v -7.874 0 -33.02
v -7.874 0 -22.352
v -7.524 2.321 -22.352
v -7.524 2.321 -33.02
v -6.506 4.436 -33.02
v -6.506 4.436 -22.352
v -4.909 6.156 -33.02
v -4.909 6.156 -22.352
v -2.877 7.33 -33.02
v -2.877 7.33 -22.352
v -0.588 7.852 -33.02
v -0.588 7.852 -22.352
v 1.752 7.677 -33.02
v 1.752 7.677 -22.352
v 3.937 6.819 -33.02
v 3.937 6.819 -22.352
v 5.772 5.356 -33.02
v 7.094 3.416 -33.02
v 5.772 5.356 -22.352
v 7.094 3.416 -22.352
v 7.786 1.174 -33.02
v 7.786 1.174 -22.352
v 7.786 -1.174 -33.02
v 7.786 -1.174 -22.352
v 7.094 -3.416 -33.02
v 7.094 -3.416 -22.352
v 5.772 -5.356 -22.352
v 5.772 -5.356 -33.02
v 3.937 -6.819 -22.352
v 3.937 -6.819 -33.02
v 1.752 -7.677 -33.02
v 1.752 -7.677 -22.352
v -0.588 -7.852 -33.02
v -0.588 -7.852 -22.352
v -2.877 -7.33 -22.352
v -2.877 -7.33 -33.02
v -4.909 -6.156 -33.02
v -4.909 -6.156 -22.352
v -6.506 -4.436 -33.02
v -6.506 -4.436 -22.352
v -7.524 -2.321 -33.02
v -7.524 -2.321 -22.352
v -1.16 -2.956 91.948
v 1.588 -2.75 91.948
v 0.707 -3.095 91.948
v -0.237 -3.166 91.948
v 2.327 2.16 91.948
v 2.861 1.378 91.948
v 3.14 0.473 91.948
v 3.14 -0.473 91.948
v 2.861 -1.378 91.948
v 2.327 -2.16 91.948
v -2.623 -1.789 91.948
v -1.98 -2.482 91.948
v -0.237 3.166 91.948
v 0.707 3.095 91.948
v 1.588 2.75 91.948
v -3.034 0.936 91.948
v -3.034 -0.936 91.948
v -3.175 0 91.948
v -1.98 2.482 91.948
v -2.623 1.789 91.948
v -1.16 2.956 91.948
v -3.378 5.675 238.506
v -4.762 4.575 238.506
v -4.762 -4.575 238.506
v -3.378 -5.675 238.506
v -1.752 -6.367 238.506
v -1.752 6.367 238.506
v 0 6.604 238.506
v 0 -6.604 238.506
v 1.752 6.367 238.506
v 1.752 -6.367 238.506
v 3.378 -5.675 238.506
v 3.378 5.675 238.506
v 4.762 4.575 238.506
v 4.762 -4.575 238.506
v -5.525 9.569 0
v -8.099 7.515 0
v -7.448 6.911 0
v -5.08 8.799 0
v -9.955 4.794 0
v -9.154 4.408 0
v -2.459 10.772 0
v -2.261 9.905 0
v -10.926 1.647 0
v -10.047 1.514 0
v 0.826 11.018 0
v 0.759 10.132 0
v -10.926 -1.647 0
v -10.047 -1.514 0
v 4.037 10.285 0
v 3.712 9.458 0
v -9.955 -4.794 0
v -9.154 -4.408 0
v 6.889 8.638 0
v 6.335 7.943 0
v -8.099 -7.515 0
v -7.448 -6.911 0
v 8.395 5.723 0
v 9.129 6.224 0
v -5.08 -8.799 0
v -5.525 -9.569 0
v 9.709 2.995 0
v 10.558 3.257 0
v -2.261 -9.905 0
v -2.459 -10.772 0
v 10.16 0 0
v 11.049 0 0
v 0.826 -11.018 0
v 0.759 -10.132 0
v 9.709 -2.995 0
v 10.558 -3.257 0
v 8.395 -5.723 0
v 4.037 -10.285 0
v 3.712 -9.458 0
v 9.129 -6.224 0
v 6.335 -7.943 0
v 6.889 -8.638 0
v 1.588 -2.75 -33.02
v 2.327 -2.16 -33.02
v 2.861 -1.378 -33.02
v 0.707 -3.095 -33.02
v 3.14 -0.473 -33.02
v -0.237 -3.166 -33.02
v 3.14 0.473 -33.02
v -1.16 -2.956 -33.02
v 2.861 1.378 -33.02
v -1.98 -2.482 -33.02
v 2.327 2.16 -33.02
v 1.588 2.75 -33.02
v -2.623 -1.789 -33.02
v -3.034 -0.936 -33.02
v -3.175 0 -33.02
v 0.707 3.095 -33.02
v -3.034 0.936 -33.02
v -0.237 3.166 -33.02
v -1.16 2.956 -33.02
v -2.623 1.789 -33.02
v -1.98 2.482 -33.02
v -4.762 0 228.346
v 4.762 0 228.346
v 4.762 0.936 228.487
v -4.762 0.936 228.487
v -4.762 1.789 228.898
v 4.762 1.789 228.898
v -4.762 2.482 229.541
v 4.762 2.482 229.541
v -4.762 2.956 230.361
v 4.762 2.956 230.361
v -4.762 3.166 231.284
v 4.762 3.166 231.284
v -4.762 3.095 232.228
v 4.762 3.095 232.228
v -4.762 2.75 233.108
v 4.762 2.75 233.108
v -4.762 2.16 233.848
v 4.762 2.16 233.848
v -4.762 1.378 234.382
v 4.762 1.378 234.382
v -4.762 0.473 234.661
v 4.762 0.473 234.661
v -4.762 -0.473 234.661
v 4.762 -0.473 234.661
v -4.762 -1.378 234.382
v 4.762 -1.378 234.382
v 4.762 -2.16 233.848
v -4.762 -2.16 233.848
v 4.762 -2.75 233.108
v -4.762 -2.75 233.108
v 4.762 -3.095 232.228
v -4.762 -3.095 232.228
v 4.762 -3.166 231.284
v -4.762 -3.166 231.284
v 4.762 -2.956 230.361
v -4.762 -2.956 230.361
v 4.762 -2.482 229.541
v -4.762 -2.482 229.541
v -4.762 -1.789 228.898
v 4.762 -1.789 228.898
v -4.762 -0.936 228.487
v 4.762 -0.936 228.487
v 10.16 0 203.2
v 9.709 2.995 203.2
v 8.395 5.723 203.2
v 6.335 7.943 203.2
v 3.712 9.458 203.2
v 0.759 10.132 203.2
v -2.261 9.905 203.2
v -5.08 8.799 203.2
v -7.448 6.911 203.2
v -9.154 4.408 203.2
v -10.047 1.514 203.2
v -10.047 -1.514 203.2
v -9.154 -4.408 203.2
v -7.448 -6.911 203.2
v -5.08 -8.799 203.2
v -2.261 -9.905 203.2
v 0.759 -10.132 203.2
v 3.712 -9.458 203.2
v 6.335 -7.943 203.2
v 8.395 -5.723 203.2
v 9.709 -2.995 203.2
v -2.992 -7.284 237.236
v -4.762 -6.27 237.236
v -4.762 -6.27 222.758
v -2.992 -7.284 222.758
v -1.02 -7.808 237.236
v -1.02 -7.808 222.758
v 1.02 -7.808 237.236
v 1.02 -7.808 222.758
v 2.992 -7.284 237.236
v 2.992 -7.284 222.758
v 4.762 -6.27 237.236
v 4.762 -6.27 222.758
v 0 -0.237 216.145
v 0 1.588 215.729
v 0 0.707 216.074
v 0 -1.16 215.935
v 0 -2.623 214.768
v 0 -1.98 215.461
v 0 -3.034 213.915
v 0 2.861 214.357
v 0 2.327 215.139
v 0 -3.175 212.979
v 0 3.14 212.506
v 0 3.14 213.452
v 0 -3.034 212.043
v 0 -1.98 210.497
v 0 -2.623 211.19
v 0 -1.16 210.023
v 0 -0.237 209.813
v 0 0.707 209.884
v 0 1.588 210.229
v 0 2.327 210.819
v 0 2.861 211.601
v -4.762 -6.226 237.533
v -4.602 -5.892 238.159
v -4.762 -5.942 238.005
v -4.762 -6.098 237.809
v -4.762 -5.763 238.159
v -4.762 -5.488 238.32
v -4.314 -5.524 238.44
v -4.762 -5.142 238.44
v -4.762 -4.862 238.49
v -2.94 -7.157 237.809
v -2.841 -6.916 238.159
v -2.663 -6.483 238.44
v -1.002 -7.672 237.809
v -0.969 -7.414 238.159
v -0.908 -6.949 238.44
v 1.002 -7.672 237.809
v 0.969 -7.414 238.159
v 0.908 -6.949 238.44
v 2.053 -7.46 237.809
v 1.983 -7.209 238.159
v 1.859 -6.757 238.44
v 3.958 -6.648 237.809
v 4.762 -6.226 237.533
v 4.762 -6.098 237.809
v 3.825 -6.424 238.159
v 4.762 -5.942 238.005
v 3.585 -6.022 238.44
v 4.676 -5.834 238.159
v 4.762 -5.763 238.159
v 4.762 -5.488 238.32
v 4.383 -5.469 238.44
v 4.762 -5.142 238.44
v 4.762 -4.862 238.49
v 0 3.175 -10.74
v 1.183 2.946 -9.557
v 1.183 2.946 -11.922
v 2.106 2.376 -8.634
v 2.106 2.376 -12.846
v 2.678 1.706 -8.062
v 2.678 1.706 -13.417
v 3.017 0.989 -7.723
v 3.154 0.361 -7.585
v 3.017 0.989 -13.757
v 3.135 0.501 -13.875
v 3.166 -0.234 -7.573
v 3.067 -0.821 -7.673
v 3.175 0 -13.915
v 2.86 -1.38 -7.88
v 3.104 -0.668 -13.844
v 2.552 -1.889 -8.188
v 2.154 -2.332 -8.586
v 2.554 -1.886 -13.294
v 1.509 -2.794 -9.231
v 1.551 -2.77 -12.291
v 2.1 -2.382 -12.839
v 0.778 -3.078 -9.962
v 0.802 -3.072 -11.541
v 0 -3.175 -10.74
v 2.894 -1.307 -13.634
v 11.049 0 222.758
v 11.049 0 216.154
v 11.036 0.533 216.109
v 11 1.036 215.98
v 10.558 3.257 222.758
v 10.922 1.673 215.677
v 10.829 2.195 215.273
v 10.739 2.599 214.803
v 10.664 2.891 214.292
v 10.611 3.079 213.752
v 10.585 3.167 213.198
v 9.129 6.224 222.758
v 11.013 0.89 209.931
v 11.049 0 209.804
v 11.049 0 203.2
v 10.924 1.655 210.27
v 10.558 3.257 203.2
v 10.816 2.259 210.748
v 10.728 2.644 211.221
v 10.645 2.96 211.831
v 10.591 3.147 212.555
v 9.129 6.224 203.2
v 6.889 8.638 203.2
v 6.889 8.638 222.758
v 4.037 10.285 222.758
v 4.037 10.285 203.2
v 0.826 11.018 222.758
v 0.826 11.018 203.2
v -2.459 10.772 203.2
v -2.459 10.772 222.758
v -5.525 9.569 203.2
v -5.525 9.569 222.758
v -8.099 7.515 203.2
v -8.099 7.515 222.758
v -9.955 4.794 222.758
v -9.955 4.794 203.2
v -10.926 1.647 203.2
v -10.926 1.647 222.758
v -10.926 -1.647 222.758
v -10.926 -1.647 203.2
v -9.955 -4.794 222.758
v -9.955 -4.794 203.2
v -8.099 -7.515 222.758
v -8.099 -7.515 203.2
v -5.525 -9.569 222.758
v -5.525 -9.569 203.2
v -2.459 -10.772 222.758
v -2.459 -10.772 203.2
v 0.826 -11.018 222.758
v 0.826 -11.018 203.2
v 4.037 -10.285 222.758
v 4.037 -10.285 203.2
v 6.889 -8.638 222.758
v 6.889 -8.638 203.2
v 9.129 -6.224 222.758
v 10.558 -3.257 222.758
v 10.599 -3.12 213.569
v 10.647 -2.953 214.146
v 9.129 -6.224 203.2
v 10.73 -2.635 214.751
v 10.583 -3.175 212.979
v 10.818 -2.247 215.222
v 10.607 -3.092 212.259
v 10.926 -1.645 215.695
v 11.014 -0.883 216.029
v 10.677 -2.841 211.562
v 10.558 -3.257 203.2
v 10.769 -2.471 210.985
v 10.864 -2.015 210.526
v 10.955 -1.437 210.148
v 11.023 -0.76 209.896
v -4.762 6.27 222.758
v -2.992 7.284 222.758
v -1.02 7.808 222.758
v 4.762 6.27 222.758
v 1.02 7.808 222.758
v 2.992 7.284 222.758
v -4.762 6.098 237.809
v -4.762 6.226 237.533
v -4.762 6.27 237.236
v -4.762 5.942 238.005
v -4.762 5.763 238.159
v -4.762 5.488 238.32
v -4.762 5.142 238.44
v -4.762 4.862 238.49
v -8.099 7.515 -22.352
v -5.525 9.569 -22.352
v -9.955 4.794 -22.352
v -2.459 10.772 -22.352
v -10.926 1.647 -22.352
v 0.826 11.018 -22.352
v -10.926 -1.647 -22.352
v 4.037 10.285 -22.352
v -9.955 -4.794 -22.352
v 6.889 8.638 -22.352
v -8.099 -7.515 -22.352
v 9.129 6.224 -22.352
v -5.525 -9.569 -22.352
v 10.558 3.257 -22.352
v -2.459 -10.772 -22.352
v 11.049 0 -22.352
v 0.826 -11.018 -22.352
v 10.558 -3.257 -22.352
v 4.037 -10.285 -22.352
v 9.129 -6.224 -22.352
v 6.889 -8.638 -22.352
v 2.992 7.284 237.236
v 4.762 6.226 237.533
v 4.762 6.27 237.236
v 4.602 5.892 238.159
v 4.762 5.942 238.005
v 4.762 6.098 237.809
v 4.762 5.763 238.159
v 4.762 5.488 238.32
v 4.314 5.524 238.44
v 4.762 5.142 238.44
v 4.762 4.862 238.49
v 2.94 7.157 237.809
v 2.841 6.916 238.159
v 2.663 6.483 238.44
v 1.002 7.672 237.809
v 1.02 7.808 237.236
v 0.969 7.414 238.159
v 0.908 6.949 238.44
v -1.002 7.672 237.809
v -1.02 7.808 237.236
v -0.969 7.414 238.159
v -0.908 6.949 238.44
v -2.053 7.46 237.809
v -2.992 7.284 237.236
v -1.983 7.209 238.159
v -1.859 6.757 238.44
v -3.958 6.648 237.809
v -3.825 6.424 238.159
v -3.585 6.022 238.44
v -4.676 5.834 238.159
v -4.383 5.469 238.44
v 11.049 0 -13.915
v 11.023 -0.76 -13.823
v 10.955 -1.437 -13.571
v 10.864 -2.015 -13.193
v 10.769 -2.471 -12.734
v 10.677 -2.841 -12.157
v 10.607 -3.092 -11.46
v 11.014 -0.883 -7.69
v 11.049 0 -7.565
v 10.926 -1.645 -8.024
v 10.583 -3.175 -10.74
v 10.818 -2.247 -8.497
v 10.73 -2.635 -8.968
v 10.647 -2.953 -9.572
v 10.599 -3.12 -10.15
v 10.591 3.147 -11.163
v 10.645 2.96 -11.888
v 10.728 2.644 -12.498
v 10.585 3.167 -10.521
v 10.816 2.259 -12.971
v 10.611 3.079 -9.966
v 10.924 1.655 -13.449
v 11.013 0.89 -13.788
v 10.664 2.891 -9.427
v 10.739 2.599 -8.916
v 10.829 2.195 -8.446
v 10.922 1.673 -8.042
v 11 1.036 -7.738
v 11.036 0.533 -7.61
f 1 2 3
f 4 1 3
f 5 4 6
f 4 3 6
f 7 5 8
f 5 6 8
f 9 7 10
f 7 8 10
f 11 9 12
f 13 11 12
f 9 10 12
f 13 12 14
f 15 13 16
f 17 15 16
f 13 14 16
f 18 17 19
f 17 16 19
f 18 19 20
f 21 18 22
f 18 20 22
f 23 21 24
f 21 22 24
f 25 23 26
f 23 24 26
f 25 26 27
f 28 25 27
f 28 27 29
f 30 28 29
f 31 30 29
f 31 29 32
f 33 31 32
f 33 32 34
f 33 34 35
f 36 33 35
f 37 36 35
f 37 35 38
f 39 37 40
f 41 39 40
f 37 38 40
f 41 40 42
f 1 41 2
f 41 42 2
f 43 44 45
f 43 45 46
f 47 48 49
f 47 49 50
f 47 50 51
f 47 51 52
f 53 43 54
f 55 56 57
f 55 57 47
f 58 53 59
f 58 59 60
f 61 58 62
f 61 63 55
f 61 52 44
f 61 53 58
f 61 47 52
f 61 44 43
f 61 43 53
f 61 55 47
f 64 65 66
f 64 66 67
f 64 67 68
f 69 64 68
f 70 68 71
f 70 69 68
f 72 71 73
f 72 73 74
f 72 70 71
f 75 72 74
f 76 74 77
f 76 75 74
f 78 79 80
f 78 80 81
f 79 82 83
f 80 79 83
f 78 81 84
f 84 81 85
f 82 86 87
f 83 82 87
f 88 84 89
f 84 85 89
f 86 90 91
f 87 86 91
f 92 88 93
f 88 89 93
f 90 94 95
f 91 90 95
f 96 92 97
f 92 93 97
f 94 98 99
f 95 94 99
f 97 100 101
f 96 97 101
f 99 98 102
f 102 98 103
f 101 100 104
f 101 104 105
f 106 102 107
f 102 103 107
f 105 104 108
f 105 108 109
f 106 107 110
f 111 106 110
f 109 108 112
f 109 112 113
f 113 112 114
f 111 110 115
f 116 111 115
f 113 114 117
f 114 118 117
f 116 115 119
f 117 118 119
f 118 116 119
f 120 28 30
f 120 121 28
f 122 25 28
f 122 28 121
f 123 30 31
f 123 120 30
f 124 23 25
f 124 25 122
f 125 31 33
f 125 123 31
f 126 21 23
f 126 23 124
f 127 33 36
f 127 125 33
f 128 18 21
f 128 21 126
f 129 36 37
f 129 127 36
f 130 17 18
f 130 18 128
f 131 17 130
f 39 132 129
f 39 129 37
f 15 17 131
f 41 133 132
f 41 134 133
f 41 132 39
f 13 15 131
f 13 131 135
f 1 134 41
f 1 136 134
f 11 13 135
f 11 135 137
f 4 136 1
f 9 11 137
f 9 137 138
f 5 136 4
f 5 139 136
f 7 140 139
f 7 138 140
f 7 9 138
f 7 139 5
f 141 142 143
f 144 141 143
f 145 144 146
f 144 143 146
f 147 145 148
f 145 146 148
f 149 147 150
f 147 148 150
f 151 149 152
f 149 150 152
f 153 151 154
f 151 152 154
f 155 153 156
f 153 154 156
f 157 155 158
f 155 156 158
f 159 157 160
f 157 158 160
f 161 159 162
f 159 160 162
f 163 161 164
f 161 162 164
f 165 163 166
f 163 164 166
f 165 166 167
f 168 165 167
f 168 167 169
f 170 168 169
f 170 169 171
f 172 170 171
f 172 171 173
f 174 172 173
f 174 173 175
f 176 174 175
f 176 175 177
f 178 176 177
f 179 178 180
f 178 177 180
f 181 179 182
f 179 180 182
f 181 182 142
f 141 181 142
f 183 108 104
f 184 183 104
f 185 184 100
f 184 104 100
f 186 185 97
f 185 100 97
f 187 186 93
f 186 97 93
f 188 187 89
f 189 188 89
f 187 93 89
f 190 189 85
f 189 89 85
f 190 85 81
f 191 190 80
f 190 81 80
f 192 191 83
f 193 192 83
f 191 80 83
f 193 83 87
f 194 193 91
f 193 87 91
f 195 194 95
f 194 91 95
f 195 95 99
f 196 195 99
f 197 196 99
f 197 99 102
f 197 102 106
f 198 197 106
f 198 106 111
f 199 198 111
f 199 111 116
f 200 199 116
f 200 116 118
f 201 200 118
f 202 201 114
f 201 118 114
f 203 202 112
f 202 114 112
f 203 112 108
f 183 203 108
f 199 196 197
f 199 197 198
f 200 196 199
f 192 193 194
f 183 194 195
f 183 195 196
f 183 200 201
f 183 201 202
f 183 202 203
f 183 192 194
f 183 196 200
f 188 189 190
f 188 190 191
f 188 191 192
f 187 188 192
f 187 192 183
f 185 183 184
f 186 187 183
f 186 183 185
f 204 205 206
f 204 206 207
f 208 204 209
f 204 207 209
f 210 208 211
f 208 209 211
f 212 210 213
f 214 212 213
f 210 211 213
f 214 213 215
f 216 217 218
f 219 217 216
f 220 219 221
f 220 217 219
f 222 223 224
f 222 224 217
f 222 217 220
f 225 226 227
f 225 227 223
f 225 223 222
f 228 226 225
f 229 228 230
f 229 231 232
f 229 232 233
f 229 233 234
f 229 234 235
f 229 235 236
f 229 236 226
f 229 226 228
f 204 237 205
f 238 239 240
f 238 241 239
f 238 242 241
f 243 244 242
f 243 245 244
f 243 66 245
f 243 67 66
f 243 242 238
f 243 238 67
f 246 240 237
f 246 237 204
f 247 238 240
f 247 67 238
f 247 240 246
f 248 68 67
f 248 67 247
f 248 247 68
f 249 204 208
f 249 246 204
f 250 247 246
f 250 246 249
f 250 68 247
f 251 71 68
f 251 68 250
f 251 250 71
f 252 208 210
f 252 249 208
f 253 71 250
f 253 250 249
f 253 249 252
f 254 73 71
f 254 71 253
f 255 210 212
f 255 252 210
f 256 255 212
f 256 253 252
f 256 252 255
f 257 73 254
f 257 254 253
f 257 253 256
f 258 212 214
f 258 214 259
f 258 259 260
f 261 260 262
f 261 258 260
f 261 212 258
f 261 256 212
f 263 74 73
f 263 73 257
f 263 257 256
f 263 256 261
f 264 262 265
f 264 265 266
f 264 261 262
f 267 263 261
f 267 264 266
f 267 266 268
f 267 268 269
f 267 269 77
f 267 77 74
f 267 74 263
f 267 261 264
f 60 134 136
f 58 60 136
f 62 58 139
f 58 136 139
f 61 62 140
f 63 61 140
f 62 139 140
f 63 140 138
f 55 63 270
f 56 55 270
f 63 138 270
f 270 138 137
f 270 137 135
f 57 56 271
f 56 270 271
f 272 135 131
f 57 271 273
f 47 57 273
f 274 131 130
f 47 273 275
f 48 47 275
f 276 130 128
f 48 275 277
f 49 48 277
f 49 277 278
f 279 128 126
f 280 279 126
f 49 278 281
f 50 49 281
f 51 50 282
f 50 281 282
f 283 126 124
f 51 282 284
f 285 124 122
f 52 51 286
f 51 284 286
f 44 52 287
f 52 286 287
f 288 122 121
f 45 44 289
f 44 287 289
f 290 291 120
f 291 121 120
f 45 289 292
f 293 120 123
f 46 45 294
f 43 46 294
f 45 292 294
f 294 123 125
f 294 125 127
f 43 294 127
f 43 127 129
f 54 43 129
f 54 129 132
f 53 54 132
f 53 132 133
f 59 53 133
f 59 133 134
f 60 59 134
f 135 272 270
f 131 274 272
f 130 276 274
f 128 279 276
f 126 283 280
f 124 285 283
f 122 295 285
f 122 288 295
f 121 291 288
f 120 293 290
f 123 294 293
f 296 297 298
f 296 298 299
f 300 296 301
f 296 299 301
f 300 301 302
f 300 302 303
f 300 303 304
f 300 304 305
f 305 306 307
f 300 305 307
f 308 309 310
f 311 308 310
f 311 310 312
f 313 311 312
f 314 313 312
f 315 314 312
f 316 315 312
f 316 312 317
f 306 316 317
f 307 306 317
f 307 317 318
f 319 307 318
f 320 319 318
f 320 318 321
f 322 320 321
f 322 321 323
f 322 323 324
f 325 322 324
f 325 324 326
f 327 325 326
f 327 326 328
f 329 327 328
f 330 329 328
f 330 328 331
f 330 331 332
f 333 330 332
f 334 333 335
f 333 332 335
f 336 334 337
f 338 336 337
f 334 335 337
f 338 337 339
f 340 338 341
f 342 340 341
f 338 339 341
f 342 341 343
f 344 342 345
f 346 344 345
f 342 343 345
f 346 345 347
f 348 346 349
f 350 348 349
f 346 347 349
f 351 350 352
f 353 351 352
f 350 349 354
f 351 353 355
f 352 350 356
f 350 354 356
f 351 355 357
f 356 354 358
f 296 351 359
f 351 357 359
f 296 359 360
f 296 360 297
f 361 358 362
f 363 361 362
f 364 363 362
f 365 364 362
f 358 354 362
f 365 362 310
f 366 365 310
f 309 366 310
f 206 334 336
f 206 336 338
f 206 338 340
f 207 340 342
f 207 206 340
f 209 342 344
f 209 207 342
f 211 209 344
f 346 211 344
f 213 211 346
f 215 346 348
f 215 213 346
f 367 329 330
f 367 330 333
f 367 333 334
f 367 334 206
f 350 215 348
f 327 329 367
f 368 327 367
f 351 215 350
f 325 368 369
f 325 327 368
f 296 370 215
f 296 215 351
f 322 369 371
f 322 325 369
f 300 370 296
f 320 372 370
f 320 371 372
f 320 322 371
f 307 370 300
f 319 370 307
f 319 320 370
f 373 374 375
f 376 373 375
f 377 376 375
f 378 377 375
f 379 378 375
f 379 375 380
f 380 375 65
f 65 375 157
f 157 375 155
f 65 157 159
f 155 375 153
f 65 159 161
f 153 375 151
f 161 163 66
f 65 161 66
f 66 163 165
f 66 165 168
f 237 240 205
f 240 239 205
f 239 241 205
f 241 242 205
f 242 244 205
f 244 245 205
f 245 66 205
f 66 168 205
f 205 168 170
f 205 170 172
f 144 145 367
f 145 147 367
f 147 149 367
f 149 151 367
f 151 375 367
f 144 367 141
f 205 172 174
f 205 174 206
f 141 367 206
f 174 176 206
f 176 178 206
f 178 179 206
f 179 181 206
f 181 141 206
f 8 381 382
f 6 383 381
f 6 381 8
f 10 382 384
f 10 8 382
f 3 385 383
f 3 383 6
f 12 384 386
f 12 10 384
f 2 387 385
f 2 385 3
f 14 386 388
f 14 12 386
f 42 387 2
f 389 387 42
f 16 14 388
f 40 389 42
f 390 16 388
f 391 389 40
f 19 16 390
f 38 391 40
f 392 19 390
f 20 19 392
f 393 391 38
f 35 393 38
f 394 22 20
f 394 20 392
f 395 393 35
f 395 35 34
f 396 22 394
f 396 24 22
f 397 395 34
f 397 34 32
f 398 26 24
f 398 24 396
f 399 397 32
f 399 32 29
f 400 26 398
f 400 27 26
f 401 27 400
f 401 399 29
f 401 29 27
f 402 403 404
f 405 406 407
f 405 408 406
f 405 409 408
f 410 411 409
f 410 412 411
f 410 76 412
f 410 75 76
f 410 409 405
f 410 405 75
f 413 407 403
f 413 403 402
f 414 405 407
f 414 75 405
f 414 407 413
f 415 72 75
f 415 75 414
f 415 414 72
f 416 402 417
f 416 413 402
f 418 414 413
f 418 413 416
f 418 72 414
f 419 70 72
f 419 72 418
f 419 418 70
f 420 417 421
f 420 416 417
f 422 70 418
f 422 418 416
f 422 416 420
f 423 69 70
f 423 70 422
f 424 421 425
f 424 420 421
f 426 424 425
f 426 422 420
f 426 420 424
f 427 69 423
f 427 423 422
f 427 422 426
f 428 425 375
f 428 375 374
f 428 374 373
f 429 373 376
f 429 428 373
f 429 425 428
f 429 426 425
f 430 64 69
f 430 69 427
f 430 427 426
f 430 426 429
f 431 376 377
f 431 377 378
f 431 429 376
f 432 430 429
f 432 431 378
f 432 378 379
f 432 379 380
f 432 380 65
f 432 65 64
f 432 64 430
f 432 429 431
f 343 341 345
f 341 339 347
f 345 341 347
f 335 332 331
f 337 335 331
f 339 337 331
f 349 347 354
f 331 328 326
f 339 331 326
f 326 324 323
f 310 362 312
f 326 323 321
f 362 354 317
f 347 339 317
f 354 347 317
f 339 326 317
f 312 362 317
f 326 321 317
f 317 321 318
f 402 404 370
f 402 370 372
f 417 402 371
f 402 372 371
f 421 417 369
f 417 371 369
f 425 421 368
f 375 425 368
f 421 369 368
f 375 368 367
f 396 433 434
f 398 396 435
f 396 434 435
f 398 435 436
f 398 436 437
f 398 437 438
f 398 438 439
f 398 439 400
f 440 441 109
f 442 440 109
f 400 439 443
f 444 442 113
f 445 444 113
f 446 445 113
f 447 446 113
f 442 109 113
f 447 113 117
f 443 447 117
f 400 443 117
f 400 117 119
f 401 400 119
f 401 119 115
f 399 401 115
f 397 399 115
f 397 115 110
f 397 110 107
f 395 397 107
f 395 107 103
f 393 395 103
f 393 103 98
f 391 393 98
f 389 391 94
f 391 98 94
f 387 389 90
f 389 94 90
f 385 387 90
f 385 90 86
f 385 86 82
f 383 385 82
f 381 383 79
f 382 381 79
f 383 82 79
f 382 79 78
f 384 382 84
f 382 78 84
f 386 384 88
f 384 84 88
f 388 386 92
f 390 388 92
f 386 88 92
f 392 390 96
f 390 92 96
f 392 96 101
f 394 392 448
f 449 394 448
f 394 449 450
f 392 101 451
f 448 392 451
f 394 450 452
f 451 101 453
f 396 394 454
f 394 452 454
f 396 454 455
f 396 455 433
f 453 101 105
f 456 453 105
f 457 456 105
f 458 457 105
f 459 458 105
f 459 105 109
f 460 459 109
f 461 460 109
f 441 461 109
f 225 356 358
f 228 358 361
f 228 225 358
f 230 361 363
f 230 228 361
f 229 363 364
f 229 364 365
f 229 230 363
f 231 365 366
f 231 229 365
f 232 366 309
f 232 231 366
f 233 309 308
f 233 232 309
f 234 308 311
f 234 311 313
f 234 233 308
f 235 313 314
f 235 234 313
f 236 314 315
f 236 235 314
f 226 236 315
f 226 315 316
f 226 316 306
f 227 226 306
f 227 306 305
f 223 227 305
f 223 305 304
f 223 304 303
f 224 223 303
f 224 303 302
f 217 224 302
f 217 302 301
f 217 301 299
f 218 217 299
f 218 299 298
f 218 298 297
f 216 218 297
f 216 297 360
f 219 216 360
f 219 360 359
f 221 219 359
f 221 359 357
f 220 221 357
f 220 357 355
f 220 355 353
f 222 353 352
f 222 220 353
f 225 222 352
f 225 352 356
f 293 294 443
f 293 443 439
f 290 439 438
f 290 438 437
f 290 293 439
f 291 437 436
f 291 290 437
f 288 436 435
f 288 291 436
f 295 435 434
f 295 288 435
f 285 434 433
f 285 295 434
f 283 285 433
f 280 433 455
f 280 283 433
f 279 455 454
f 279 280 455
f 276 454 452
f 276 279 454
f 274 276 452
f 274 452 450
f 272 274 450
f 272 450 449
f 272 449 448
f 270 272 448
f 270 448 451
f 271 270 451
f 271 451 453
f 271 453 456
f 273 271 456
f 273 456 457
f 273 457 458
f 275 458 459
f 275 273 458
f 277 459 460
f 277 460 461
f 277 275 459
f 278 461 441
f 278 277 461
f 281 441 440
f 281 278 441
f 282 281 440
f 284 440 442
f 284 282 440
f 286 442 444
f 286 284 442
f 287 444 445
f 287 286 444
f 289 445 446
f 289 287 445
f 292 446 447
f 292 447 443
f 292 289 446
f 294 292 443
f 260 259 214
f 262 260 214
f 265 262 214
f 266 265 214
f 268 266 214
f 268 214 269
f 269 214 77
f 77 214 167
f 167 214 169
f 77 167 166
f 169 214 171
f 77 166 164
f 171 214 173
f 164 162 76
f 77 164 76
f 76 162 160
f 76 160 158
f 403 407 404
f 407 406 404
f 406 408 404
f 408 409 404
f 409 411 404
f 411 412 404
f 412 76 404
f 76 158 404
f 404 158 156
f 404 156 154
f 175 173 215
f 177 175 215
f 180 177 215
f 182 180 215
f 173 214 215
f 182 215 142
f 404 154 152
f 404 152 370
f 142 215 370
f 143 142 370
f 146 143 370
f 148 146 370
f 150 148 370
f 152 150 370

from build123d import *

# Parameters (mm, degrees)
SKETCH1_R               = 10.16
BOSS_EXTRUDE1_DEPTH     = 203.2
SKETCH2_R               = 11.049
BOSS_EXTRUDE2_DEPTH     = 19.558
BOSS_EXTRUDE3_DEPTH     = 15.748
SKETCH4_R               = 3.175
CUT_EXTRUDE1_DEPTH      = 9.525
FILLET1_R               = 1.27
SKETCH5_R               = 11.049
BOSS_EXTRUDE4_DEPTH     = 22.352
SKETCH6_R               = 7.874
BOSS_EXTRUDE5_DEPTH     = 10.668
SKETCH7_R               = 3.175
CUT_EXTRUDE2_DEPTH      = 124.968
CUT_EXTRUDE3_REACH      = 241.017
CUT_EXTRUDE3_END_RADIUS = 11.049
SKETCH8_R               = 3.175


with BuildPart() as part:
    # Sketch1 → Boss-Extrude1 (new body)
    with BuildSketch(Plane.XY):
        Circle(SKETCH1_R)
    extrude(amount=BOSS_EXTRUDE1_DEPTH)

    # Sketch5 → Boss-Extrude4 (add)
    with BuildSketch(Plane(origin=(0, 0, 0), x_dir=(-1, 0, 0), z_dir=(0, 0, -1))):
        with Locations(Location((0, 0, 0), (0, 0, 180))):
            Circle(SKETCH5_R)
    extrude(amount=BOSS_EXTRUDE4_DEPTH)

    # Sketch6 → Boss-Extrude5 (add)
    with BuildSketch(Plane(origin=(0, 0, -22.352), x_dir=(-1, 0, 0), z_dir=(0, 0, -1))):
        Circle(SKETCH6_R)
    extrude(amount=BOSS_EXTRUDE5_DEPTH)

    # Sketch7 → Cut-Extrude2 (cut)
    with BuildSketch(Plane(origin=(0, 0, -33.02), x_dir=(-1, 0, 0), z_dir=(0, 0, -1))):
        Circle(SKETCH7_R)
    extrude(amount=-CUT_EXTRUDE2_DEPTH, mode=Mode.SUBTRACT)


with BuildPart() as body_2:
    # Sketch2 → Boss-Extrude2 (new body)
    with BuildSketch(Plane.XY.offset(203.2)):
        Circle(SKETCH2_R)
    extrude(amount=BOSS_EXTRUDE2_DEPTH)

    # Sketch3 → Boss-Extrude3 (add)
    with BuildSketch(Plane.XY.offset(222.758)):
        with BuildLine():
            Line((4.7625, -6.270444143), (4.7625, 6.270444143))
            ThreePointArc((4.7625, 6.270444143), (0, 7.874), (-4.7625, 6.270444143))
            Line((-4.7625, 6.270444143), (-4.7625, -6.270444143))
            ThreePointArc((-4.7625, -6.270444143), (0, -7.874), (4.7625, -6.270444143))
        make_face()
    extrude(amount=BOSS_EXTRUDE3_DEPTH)

    # Sketch4 → Cut-Extrude1 (cut)
    with BuildSketch(Plane(origin=(4.7625, 0, 0), x_dir=(0, 0, -1), z_dir=(1, 0, 0))):
        with Locations((-231.521, 0)):
            Circle(SKETCH4_R)
    extrude(amount=-CUT_EXTRUDE1_DEPTH, mode=Mode.SUBTRACT)

    # Fillet1
    fillet1_edges = [body_2.edges().sort_by_distance(p)[0] for p in [
        (0, 7.874, 238.506),
        (0, -7.874, 238.506),
    ]]
    fillet(fillet1_edges, radius=FILLET1_R)


with BuildPart() as cut_extrude3_tool:
    # Cut-Extrude3: up to this cylinder (the profile starts inside it)
    cut_extrude3_end = Plane(origin=(0, 0, 101.119601), z_dir=(0, 0, -1)) * Cylinder(CUT_EXTRUDE3_END_RADIUS, 728.850798, mode=Mode.PRIVATE)
    # Sketch8 → Cut-Extrude3 (new, up to the surface)
    with BuildSketch(Plane(origin=(0, 0, 0), x_dir=(0, 0, -1), z_dir=(1, 0, 0)), mode=Mode.PRIVATE) as cut_extrude3_sk1:
        with Locations(Location((-212.979, 0, 0), (0, 0, 270))):
            Circle(SKETCH8_R)
    cut_extrude3_tool1 = extrude(cut_extrude3_sk1.sketch, amount=CUT_EXTRUDE3_REACH, mode=Mode.PRIVATE) & cut_extrude3_end
    add(cut_extrude3_tool1.solids().sort_by_distance((0, 0, 212.979))[0])
    # Sketch8 → Cut-Extrude3 (new, up to the surface)
    with BuildSketch(Plane(origin=(0, 0, 0), x_dir=(0, 0, -1), z_dir=(1, 0, 0)), mode=Mode.PRIVATE) as cut_extrude3_sk2:
        with Locations(Location((10.739797543, 0, 0), (0, 0, 270))):
            Circle(SKETCH8_R)
    cut_extrude3_tool2 = extrude(cut_extrude3_sk2.sketch, amount=CUT_EXTRUDE3_REACH, mode=Mode.PRIVATE) & cut_extrude3_end
    add(cut_extrude3_tool2.solids().sort_by_distance((0, 0, -10.739798))[0])


with BuildPart() as part_1:
    add(part.part)

    # Cut-Extrude3: cut by cut_extrude3_tool
    add(cut_extrude3_tool.part, mode=Mode.SUBTRACT)


with BuildPart() as body_2_1:
    add(body_2.part)

    # Cut-Extrude3: cut by cut_extrude3_tool
    add(cut_extrude3_tool.part, mode=Mode.SUBTRACT)


solid = Compound([part_1.part, body_2_1.part])
